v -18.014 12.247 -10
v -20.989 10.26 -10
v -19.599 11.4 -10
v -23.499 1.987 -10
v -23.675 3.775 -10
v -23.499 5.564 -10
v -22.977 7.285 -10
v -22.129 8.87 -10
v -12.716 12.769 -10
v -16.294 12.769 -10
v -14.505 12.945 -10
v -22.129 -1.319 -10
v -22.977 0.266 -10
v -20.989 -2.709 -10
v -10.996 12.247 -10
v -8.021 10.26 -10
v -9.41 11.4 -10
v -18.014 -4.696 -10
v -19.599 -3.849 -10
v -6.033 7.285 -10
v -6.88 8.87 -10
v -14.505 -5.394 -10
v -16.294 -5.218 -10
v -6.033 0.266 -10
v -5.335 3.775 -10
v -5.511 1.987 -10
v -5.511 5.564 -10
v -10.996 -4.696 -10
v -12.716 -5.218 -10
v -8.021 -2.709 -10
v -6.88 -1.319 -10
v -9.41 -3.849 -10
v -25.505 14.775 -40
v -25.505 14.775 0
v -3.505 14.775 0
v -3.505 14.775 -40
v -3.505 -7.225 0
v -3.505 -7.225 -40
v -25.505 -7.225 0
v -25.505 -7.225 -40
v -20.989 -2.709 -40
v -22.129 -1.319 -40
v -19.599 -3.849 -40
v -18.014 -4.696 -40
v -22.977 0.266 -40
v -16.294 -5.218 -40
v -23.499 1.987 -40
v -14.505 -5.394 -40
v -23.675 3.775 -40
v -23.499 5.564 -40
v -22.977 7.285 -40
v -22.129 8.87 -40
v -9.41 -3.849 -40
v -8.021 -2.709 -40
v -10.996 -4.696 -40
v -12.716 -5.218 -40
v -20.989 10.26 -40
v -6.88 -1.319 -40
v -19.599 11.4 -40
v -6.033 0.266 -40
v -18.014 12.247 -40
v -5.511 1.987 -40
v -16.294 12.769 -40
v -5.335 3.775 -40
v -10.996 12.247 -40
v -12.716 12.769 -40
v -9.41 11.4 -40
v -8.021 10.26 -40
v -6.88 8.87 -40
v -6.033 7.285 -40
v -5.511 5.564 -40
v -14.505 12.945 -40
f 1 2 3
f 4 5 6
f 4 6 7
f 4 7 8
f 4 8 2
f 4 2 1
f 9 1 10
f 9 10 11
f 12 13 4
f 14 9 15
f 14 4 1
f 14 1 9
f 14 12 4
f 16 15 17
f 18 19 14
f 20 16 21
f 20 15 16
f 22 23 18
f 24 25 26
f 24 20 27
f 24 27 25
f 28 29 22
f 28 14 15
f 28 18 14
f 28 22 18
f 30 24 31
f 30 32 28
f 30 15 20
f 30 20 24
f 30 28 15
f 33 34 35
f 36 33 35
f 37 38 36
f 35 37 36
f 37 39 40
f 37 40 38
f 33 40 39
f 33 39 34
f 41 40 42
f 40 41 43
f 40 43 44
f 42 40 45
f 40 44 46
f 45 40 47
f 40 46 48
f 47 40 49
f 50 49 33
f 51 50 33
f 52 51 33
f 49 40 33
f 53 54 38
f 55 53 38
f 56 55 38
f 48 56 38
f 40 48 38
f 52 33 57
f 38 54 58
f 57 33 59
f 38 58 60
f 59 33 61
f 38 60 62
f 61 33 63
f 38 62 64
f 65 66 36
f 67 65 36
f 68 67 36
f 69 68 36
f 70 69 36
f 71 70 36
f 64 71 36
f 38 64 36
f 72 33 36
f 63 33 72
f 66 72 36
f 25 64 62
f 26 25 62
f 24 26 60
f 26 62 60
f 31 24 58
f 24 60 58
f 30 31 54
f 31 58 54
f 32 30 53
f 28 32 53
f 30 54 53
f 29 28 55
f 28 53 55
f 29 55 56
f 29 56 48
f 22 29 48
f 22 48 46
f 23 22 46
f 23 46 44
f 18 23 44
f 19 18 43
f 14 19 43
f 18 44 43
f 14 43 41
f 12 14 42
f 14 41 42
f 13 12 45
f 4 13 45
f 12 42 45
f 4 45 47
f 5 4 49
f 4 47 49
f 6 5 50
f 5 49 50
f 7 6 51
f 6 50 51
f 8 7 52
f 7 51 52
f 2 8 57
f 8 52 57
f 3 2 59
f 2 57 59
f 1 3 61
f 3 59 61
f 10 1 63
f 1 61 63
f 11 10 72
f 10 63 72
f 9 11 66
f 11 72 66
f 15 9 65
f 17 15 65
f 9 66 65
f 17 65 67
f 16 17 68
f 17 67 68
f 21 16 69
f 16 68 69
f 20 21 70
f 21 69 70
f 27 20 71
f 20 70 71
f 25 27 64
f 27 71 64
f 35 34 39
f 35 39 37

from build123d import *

# Parameters (mm, degrees)
F0_W     = 22
F0_H     = 22
F1_DEPTH = 40
F2_R     = 9.169913
F3_DEPTH = 30


with BuildPart() as f1:
    # F0 (on Top) → F1 (new body)
    with BuildSketch(Plane.XY):
        with Locations((-14.504899, 3.775477)):
            Rectangle(F0_W, F0_H)
    extrude(amount=-F1_DEPTH)

    # F2 (on face) → F3 (cut)
    with BuildSketch(Plane(origin=(0, 0, -40), x_dir=(1, 0, 0), z_dir=(0, 0, -1))):
        with Locations((-14.504899, -3.775477)):
            Circle(F2_R)
    extrude(amount=-F3_DEPTH, mode=Mode.SUBTRACT)


solid = f1.part
